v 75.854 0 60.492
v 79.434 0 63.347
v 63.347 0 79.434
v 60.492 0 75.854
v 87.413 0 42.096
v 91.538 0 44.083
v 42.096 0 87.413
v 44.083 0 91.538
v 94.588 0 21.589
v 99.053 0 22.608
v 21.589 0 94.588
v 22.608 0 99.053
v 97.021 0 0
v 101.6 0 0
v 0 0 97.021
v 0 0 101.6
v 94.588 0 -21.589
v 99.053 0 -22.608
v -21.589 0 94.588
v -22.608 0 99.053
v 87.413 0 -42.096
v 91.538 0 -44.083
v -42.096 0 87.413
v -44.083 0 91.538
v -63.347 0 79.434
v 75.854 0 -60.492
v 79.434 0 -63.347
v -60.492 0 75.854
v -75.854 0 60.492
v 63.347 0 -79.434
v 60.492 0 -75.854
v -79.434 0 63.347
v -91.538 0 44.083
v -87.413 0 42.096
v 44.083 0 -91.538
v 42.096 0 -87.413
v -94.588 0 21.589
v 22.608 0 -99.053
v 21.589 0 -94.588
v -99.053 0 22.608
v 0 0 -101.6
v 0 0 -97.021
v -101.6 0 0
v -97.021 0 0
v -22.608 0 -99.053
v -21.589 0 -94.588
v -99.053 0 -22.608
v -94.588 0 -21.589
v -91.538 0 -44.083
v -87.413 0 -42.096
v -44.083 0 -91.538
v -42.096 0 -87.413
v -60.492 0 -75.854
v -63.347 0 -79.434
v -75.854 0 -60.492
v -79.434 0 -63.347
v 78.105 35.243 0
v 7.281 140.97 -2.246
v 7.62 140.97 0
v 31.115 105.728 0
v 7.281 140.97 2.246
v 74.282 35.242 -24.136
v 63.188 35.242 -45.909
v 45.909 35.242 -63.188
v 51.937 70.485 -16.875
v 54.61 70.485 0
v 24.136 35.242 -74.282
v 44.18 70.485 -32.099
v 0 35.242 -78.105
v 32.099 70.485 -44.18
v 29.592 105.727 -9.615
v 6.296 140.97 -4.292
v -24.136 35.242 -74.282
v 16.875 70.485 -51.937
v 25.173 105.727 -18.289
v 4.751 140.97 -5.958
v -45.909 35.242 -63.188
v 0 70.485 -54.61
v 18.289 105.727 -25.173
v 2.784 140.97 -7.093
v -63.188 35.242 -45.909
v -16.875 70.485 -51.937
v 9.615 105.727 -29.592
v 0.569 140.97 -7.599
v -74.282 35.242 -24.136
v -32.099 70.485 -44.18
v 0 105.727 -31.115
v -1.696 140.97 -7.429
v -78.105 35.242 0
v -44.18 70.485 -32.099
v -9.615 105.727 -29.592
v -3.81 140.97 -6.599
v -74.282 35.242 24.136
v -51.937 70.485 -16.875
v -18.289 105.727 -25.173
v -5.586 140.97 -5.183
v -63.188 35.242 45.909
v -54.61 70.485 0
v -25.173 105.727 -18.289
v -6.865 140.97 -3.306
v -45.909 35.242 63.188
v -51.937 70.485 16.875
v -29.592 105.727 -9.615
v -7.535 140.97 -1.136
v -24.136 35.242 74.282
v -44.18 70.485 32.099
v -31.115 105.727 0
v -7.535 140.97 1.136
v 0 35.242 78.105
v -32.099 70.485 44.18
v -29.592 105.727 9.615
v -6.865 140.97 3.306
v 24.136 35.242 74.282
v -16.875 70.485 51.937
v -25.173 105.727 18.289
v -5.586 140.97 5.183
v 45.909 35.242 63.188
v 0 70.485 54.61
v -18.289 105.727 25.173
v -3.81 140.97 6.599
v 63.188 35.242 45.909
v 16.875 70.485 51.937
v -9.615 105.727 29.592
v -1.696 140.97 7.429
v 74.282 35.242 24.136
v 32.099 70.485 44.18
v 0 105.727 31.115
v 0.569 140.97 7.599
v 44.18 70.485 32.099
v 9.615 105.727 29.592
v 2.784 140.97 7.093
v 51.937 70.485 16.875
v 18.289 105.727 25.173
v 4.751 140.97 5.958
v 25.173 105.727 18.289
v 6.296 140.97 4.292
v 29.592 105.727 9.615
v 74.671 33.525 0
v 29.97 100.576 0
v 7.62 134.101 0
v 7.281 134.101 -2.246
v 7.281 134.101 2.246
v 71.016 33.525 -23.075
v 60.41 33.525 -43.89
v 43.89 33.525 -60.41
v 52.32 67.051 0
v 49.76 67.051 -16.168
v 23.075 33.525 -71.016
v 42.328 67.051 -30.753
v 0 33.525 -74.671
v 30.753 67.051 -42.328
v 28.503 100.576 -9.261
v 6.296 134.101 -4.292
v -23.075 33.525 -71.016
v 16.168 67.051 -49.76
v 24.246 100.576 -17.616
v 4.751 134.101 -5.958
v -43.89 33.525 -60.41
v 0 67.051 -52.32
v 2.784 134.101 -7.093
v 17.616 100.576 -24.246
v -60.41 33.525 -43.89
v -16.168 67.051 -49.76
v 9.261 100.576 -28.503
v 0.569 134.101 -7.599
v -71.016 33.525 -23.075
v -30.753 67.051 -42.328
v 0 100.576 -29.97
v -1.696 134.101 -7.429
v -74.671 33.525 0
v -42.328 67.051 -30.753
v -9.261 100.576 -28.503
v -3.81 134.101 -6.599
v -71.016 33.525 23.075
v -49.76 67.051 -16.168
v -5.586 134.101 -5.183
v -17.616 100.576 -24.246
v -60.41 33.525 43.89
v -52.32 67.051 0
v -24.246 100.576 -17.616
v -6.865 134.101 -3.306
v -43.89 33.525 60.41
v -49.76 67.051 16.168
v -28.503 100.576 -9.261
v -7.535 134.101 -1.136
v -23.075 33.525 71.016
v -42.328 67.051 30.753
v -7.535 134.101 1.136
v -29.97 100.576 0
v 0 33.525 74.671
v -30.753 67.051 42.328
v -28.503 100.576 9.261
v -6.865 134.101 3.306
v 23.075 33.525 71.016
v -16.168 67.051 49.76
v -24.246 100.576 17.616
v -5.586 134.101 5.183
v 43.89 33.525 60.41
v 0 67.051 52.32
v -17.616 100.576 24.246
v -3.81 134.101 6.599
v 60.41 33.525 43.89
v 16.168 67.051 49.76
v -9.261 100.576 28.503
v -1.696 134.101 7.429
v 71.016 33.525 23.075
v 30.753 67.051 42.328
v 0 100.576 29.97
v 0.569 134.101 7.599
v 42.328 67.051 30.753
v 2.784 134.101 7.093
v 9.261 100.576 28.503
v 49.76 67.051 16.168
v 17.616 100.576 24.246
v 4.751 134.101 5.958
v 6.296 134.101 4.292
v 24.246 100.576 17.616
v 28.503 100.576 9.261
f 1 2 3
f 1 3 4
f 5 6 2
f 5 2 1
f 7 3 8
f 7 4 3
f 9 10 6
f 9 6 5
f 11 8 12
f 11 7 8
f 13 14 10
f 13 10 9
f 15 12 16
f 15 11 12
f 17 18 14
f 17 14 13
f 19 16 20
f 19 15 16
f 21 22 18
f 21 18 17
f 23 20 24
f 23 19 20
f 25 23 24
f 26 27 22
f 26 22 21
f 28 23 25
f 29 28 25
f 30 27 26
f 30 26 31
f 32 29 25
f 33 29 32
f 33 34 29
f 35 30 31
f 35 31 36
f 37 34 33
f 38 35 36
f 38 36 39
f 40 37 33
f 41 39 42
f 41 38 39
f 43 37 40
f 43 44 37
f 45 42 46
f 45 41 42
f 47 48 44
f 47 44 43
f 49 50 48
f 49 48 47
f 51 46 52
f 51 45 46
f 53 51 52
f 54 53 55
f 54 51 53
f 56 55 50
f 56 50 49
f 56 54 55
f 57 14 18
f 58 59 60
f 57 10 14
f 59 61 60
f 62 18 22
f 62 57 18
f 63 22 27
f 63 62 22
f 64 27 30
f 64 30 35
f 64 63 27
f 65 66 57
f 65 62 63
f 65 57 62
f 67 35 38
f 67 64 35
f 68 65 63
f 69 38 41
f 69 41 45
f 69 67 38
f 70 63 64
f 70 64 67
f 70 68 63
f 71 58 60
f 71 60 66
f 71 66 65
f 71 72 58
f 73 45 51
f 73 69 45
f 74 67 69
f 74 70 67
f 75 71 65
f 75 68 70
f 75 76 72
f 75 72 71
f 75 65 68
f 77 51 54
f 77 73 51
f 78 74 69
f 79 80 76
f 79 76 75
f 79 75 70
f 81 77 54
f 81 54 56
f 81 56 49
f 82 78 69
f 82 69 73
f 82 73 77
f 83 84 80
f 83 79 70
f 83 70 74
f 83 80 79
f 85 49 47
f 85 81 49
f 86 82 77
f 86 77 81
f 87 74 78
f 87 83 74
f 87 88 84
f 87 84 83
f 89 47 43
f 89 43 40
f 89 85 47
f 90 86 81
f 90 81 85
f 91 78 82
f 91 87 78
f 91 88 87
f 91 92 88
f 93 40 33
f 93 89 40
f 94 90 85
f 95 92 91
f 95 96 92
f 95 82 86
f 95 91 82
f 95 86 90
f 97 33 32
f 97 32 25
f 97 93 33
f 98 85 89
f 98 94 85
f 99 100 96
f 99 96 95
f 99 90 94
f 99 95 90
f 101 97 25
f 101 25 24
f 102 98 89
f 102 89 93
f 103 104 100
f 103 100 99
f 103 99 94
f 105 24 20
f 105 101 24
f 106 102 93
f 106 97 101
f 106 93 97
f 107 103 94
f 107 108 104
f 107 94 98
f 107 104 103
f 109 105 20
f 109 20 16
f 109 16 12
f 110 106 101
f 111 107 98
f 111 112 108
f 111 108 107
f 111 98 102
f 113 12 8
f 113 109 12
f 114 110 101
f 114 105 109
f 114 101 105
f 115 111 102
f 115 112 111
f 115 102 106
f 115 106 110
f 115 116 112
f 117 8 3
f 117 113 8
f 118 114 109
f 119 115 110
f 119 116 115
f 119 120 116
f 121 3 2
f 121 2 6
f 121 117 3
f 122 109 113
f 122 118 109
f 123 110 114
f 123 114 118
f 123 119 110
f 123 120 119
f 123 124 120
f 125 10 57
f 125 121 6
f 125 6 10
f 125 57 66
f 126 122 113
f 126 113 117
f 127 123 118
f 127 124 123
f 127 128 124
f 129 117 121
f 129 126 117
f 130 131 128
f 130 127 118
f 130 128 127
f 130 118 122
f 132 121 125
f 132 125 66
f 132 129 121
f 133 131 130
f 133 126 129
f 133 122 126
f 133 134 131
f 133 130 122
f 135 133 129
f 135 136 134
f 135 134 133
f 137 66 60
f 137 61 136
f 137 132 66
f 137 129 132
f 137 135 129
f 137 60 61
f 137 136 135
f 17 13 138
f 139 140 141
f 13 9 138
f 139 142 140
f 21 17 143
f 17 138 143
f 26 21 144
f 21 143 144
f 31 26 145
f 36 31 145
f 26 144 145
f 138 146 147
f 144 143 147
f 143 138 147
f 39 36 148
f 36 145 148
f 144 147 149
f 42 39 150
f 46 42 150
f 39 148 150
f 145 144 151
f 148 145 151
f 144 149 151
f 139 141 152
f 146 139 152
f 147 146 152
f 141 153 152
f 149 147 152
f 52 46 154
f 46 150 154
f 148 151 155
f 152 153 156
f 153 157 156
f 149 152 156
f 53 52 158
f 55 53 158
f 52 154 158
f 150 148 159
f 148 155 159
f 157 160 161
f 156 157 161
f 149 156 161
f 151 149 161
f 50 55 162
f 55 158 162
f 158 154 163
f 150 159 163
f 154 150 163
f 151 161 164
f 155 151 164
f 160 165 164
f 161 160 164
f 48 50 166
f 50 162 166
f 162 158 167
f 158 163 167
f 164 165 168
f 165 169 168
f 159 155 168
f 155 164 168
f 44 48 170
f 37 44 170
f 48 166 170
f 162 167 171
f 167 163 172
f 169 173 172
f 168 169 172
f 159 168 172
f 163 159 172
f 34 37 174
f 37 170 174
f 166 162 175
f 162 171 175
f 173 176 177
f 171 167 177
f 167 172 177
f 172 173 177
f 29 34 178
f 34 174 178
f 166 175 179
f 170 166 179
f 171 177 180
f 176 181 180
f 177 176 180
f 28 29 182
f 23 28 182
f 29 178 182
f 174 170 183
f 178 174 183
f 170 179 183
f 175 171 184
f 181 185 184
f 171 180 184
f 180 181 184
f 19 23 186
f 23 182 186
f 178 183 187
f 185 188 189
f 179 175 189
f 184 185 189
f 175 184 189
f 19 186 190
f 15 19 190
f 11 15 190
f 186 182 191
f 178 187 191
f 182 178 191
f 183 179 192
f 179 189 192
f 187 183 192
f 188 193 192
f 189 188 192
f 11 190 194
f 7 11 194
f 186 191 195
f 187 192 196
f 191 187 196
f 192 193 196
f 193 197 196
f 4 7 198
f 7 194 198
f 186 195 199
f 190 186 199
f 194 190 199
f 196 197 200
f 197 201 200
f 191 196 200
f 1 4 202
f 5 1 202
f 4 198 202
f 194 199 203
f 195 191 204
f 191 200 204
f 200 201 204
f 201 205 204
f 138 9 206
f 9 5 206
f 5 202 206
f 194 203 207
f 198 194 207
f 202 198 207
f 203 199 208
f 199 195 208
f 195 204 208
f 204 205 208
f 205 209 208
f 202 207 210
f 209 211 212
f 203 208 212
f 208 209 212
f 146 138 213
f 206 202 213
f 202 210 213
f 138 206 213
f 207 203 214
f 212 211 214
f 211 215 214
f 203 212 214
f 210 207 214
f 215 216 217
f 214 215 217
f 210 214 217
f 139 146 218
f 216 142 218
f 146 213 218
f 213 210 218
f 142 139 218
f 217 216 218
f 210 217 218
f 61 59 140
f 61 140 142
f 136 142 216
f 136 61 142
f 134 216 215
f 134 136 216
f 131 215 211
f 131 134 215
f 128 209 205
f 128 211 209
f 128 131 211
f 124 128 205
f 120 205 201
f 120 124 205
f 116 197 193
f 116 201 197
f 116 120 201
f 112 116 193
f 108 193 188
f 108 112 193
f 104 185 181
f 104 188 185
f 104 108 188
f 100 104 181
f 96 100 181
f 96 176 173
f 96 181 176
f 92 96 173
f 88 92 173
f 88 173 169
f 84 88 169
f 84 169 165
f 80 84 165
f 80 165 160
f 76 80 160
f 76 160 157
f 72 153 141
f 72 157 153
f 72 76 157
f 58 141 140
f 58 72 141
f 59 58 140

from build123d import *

# Parameters (mm, degrees)
F3_T     = -3.81
F4_R     = 7.62
F5_DEPTH = 33.02


with BuildPart() as f1:
    # F0 (on Top) → F1 (revolve)
    with BuildSketch(Plane.XY):
        Polygon((0, 152.4), (0, 0), (101.6, 0), align=None)
    revolve(axis=Axis((0, 76.2, 0), (0, 1, 0)))

    # F3
    f3_openings = [f1.faces().sort_by_distance(p)[0] for p in [
        (0, 0, 0),
    ]]
    offset(amount=F3_T, openings=f3_openings)

    # F4 (on offset) → F5 (cut)
    with BuildSketch(Plane.XZ.offset(-152.4)):
        Circle(F4_R)
    extrude(amount=F5_DEPTH, mode=Mode.SUBTRACT)


solid = f1.part
